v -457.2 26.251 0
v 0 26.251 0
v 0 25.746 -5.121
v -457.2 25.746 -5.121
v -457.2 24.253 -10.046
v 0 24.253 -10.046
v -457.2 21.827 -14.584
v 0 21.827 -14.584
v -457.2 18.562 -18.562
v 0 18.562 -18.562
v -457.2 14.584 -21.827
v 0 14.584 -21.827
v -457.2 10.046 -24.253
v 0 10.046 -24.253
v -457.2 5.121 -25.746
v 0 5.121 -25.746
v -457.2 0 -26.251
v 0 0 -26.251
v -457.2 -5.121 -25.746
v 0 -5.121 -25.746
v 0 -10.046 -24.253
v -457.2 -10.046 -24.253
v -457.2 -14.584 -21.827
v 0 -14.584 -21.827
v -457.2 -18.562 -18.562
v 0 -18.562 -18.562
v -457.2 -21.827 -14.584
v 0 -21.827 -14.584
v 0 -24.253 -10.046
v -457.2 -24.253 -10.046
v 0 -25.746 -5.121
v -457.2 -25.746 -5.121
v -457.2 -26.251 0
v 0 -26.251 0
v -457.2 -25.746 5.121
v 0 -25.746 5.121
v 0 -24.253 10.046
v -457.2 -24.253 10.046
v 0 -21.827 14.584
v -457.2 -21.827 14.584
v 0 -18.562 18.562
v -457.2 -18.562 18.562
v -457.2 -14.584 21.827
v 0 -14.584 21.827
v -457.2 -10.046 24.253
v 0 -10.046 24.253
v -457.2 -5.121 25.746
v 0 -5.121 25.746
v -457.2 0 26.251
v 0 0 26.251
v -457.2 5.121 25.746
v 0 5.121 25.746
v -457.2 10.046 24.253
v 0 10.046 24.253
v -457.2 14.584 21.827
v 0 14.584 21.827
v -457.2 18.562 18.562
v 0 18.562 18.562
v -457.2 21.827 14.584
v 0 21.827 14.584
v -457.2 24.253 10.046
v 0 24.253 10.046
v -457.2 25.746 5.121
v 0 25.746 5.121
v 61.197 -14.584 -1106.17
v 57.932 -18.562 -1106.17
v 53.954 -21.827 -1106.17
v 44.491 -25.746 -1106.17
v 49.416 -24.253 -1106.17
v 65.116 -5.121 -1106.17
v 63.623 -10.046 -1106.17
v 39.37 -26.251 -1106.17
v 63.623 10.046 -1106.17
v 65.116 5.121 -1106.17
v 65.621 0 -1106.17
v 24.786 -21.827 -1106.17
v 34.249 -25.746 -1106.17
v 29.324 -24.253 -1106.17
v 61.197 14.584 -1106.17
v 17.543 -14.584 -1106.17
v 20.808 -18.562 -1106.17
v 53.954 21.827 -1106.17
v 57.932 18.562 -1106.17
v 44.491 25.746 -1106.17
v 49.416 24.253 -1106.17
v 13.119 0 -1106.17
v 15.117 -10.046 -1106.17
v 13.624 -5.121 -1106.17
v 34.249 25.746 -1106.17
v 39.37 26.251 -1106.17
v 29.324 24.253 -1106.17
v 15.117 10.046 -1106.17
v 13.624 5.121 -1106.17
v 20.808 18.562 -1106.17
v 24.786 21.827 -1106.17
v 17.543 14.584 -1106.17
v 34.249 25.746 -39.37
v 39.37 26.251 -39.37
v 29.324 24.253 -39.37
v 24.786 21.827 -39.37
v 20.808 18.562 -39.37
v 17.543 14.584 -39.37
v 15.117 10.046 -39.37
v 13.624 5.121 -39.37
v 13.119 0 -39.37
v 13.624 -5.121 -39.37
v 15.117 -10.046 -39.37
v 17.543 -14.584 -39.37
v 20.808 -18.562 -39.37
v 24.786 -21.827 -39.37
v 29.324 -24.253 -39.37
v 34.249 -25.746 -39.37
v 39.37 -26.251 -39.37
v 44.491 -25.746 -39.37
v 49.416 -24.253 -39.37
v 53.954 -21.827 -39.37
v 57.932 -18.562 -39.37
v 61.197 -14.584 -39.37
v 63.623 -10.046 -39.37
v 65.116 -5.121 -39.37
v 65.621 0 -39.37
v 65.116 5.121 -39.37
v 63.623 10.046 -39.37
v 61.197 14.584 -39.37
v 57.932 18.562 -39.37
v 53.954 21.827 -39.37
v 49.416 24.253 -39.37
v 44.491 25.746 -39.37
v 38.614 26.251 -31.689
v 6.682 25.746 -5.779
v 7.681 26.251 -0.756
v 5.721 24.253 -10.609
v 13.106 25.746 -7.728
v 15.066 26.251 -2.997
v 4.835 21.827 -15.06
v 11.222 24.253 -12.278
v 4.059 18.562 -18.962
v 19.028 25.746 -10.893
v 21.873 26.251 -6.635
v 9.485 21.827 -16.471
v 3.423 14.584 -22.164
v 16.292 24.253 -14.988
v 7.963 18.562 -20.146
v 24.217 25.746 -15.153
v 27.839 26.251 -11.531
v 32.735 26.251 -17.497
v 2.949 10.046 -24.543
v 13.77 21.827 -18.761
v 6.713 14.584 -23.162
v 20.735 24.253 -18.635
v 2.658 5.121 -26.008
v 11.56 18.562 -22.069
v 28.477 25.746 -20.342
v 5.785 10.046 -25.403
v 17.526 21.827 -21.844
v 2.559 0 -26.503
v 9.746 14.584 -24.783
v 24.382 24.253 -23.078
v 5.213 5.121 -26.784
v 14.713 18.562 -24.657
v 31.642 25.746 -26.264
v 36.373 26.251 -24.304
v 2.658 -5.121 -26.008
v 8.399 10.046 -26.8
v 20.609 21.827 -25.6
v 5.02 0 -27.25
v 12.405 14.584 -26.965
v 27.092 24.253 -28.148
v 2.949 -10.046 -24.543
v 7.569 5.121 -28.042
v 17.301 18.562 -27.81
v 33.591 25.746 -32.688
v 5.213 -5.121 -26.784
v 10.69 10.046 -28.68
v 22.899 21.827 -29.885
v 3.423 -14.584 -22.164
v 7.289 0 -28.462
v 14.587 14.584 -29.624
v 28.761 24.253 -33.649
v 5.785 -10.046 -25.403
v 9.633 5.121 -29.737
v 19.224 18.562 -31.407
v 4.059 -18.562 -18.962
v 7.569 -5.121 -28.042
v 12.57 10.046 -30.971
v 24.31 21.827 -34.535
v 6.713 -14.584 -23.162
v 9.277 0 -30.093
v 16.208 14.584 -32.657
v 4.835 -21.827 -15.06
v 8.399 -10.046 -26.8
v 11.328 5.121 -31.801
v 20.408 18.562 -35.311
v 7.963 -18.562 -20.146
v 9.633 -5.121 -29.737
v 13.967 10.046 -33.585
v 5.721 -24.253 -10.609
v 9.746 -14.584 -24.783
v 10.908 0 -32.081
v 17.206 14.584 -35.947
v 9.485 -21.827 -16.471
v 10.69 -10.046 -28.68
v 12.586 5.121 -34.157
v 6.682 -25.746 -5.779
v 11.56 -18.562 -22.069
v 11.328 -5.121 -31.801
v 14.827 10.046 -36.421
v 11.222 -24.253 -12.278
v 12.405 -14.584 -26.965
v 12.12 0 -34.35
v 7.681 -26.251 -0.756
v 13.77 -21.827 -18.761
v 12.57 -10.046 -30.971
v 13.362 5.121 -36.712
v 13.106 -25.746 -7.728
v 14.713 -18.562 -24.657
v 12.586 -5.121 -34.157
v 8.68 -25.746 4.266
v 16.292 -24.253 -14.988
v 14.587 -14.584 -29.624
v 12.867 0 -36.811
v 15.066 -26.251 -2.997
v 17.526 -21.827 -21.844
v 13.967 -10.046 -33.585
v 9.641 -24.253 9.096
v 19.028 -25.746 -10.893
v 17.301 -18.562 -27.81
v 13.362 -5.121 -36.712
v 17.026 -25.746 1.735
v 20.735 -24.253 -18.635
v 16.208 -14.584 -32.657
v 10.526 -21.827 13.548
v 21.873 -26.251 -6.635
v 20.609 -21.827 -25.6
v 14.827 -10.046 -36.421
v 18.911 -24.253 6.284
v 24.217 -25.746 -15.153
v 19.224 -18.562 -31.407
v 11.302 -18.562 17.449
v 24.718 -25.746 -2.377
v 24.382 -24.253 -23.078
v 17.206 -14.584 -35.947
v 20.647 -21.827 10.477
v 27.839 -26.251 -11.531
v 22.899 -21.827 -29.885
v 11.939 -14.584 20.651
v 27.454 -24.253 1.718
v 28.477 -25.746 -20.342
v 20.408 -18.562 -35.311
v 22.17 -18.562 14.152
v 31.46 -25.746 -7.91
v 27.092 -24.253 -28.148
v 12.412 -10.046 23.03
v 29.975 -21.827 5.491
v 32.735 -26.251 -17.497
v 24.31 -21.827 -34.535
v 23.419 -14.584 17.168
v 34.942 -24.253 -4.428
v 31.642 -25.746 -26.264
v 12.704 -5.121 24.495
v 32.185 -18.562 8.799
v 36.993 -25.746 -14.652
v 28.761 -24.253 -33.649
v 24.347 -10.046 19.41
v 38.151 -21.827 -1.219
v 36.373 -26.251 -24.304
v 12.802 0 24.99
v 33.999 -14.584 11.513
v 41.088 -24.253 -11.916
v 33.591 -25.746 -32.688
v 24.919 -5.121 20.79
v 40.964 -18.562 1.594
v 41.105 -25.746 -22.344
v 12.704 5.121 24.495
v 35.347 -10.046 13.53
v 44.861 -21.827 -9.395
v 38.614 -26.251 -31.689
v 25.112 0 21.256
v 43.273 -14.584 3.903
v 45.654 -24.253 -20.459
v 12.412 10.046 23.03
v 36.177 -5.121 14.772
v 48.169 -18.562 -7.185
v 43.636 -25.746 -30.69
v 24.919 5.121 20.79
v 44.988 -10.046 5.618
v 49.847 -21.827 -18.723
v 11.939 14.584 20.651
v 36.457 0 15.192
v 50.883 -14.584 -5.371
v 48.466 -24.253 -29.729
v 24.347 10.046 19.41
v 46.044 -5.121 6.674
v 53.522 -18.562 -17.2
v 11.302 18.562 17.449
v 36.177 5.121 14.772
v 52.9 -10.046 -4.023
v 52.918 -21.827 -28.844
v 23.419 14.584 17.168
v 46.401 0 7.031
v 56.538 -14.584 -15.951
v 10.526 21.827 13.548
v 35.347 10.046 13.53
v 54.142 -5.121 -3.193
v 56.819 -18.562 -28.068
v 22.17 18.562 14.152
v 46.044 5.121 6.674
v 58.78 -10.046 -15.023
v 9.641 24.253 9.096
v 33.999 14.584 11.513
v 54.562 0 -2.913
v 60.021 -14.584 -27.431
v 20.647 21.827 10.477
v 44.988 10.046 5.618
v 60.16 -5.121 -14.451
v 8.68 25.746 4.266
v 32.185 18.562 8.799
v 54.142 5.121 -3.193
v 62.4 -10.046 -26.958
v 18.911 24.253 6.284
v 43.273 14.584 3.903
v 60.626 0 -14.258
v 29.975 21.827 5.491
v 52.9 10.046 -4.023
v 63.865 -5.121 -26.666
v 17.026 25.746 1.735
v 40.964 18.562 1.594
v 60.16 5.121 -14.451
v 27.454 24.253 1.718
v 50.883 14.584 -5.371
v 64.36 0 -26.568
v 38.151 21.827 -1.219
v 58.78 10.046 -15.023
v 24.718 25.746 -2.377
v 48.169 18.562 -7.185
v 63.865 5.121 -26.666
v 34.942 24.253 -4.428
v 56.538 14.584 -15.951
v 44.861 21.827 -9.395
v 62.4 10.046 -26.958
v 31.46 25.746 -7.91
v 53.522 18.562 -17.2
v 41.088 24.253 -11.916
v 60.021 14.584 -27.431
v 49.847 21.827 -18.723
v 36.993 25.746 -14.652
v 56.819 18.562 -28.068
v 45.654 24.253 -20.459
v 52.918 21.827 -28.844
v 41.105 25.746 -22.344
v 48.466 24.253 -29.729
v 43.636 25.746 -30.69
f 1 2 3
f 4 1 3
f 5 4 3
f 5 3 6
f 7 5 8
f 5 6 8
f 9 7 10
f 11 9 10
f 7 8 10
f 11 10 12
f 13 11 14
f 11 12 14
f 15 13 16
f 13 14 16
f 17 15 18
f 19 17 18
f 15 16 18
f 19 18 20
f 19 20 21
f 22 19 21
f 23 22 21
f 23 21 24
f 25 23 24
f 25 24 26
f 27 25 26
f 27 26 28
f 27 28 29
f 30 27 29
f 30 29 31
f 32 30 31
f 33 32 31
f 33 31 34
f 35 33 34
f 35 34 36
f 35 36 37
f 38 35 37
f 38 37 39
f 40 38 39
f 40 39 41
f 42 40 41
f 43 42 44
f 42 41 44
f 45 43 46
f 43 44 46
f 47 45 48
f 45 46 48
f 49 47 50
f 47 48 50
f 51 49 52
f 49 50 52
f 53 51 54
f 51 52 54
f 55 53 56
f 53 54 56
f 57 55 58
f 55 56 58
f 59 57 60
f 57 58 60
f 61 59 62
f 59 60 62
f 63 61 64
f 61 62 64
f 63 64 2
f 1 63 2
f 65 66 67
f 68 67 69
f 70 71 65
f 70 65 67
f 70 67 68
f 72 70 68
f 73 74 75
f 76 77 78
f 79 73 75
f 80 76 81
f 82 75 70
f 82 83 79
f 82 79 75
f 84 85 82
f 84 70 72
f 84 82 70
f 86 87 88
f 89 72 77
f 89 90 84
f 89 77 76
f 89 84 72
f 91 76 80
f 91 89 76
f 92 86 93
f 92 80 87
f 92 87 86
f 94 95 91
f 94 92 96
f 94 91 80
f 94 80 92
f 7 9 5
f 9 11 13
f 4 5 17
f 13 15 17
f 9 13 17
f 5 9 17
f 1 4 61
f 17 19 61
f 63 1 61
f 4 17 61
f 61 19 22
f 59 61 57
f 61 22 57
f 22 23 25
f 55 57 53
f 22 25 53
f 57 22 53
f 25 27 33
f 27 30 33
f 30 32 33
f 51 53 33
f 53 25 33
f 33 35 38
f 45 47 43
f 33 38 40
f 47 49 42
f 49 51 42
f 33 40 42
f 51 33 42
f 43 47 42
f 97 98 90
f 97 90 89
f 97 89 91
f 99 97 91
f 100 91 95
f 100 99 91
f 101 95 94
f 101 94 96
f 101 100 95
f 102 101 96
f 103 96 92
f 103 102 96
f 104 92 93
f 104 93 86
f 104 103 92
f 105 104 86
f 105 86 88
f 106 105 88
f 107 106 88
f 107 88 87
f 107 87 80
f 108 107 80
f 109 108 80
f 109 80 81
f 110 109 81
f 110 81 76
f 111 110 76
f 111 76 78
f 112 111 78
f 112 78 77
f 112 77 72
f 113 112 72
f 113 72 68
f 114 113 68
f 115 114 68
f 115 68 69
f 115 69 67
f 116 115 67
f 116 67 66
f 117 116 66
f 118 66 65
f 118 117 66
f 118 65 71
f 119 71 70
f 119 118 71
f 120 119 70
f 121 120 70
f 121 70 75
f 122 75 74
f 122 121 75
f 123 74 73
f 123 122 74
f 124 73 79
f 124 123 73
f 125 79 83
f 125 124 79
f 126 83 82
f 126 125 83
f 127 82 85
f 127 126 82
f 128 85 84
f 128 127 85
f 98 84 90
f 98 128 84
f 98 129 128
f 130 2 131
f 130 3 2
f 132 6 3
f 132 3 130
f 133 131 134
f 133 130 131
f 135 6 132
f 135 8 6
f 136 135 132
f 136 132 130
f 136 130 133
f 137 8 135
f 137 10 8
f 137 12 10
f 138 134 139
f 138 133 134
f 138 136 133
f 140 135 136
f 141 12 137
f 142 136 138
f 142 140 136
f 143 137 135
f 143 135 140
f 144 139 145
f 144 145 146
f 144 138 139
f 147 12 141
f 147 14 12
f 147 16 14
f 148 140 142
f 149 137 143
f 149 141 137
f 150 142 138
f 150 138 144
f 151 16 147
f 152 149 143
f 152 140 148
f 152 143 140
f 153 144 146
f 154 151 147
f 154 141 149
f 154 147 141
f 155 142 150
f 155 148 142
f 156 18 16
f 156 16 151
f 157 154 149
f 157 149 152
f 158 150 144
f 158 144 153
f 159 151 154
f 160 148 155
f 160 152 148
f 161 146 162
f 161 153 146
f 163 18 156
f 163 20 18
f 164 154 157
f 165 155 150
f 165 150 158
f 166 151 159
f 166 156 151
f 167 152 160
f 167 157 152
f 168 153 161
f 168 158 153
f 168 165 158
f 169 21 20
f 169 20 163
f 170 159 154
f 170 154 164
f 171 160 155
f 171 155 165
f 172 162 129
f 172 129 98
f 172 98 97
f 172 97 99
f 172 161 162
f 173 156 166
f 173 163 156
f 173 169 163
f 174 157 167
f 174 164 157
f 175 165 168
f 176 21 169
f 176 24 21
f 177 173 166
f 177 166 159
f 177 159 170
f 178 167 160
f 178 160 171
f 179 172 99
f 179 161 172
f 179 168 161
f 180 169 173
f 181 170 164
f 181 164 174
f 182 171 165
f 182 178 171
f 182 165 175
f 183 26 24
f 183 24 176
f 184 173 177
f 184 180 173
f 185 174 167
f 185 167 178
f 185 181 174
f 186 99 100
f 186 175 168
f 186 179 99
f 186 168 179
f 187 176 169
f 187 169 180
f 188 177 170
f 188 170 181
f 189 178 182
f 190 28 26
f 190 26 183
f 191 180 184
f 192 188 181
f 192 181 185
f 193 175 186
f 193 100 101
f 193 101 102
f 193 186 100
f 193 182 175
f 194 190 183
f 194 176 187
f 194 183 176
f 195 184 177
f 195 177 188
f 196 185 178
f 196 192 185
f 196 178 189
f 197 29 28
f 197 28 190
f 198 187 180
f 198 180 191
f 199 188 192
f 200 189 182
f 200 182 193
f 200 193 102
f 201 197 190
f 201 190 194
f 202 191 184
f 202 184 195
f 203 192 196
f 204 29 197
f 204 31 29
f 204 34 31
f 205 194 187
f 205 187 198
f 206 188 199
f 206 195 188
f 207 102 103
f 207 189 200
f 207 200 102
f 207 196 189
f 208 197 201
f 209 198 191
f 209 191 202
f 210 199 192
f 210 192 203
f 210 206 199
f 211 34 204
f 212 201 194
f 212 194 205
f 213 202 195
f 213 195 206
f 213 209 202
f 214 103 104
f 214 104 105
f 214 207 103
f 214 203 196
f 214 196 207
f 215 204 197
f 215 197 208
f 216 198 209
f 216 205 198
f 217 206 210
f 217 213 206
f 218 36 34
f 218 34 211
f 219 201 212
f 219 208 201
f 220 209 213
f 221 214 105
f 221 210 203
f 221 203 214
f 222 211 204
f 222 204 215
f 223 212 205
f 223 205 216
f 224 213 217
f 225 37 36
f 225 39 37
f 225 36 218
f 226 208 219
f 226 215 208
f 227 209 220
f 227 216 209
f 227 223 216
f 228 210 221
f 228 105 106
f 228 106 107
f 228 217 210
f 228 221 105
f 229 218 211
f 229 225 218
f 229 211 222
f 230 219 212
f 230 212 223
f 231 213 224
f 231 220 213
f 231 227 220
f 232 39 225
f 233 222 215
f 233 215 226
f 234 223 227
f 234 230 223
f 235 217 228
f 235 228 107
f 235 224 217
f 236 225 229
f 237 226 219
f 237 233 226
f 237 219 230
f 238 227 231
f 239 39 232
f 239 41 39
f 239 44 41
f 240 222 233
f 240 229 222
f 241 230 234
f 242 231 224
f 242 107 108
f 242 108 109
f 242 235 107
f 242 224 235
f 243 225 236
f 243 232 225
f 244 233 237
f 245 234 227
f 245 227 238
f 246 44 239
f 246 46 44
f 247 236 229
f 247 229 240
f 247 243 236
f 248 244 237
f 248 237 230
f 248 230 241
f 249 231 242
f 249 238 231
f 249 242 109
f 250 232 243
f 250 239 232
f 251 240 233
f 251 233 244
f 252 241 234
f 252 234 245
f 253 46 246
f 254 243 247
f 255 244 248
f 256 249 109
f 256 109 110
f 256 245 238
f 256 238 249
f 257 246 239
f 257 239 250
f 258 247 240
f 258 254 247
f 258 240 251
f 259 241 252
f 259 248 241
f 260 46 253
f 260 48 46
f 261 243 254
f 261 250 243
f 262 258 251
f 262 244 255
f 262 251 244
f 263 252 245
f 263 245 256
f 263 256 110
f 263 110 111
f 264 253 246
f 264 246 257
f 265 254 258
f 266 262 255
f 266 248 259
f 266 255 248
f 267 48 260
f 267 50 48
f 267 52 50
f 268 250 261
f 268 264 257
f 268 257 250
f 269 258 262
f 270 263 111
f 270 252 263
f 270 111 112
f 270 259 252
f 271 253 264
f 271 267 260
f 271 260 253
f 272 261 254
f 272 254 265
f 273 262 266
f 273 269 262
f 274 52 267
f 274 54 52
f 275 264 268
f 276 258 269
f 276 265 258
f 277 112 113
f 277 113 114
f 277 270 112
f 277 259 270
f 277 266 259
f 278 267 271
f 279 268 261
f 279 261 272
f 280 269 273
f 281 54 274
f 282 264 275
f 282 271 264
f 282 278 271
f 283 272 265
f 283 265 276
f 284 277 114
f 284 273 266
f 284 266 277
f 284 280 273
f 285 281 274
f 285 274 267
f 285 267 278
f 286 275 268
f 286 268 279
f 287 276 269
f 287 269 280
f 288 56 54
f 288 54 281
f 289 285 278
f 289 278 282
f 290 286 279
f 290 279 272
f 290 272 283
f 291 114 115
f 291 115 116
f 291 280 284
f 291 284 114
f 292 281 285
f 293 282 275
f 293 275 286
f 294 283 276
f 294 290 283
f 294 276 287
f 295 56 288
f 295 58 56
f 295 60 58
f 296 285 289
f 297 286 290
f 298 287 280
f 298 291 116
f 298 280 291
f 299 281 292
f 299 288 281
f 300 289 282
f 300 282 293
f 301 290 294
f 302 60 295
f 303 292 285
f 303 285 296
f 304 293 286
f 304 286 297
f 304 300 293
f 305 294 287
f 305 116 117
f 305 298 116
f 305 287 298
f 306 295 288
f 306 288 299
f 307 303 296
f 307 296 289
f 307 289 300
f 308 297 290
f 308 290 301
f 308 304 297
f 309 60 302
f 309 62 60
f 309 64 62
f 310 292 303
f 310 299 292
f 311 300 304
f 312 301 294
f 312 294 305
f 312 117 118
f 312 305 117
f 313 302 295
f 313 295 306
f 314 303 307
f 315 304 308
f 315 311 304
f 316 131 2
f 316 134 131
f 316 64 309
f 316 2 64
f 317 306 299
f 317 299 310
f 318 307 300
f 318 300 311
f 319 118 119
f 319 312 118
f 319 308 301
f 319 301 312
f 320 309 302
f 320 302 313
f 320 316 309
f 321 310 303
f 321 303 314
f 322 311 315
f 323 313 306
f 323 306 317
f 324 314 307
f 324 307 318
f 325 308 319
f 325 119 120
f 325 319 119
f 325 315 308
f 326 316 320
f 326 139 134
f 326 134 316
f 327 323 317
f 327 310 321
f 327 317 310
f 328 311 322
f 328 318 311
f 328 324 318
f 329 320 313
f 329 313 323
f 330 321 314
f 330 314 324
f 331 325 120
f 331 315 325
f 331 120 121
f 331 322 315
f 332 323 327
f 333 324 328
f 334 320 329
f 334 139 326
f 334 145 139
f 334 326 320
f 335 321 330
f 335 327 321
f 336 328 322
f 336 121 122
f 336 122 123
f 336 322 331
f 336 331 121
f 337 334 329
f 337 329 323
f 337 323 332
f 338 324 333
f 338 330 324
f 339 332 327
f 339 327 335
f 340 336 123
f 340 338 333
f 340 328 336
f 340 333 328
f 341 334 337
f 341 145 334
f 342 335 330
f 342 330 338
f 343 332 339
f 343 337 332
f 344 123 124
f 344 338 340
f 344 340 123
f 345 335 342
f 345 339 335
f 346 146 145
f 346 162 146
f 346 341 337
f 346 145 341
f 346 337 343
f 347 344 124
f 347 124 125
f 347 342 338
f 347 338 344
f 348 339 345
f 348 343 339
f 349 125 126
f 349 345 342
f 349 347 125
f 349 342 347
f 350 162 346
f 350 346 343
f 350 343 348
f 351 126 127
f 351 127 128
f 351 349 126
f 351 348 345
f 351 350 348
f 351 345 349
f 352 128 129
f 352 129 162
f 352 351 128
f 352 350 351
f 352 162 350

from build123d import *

# Parameters (mm, degrees)
F0_R     = 26.2509
F3_DEPTH = 457.2
F4_DEPTH = 1066.8


with BuildPart() as f2:
    # F2: sweep along a path in F1
    with BuildLine(Plane.XZ) as f2_path:
        ThreePointArc((0, 0), (27.8387939753, -11.5312060247), (39.37, -39.37))
    # F0 (on Right) → F2 (sweep)
    with BuildSketch(Plane.YZ):
        Circle(F0_R)
    sweep(path=f2_path.line)

    # F3 (add): a face of the model
    f3_faces = [f2.faces().sort_by_distance(p)[0] for p in [
        (0, 0, 0),
    ]]
    extrude(f3_faces, amount=F3_DEPTH)

    # F4 (add): a face of the model
    f4_faces = [f2.faces().sort_by_distance(p)[0] for p in [
        (39.37, 0, -39.37),
    ]]
    extrude(f4_faces, amount=F4_DEPTH)


solid = f2.part
